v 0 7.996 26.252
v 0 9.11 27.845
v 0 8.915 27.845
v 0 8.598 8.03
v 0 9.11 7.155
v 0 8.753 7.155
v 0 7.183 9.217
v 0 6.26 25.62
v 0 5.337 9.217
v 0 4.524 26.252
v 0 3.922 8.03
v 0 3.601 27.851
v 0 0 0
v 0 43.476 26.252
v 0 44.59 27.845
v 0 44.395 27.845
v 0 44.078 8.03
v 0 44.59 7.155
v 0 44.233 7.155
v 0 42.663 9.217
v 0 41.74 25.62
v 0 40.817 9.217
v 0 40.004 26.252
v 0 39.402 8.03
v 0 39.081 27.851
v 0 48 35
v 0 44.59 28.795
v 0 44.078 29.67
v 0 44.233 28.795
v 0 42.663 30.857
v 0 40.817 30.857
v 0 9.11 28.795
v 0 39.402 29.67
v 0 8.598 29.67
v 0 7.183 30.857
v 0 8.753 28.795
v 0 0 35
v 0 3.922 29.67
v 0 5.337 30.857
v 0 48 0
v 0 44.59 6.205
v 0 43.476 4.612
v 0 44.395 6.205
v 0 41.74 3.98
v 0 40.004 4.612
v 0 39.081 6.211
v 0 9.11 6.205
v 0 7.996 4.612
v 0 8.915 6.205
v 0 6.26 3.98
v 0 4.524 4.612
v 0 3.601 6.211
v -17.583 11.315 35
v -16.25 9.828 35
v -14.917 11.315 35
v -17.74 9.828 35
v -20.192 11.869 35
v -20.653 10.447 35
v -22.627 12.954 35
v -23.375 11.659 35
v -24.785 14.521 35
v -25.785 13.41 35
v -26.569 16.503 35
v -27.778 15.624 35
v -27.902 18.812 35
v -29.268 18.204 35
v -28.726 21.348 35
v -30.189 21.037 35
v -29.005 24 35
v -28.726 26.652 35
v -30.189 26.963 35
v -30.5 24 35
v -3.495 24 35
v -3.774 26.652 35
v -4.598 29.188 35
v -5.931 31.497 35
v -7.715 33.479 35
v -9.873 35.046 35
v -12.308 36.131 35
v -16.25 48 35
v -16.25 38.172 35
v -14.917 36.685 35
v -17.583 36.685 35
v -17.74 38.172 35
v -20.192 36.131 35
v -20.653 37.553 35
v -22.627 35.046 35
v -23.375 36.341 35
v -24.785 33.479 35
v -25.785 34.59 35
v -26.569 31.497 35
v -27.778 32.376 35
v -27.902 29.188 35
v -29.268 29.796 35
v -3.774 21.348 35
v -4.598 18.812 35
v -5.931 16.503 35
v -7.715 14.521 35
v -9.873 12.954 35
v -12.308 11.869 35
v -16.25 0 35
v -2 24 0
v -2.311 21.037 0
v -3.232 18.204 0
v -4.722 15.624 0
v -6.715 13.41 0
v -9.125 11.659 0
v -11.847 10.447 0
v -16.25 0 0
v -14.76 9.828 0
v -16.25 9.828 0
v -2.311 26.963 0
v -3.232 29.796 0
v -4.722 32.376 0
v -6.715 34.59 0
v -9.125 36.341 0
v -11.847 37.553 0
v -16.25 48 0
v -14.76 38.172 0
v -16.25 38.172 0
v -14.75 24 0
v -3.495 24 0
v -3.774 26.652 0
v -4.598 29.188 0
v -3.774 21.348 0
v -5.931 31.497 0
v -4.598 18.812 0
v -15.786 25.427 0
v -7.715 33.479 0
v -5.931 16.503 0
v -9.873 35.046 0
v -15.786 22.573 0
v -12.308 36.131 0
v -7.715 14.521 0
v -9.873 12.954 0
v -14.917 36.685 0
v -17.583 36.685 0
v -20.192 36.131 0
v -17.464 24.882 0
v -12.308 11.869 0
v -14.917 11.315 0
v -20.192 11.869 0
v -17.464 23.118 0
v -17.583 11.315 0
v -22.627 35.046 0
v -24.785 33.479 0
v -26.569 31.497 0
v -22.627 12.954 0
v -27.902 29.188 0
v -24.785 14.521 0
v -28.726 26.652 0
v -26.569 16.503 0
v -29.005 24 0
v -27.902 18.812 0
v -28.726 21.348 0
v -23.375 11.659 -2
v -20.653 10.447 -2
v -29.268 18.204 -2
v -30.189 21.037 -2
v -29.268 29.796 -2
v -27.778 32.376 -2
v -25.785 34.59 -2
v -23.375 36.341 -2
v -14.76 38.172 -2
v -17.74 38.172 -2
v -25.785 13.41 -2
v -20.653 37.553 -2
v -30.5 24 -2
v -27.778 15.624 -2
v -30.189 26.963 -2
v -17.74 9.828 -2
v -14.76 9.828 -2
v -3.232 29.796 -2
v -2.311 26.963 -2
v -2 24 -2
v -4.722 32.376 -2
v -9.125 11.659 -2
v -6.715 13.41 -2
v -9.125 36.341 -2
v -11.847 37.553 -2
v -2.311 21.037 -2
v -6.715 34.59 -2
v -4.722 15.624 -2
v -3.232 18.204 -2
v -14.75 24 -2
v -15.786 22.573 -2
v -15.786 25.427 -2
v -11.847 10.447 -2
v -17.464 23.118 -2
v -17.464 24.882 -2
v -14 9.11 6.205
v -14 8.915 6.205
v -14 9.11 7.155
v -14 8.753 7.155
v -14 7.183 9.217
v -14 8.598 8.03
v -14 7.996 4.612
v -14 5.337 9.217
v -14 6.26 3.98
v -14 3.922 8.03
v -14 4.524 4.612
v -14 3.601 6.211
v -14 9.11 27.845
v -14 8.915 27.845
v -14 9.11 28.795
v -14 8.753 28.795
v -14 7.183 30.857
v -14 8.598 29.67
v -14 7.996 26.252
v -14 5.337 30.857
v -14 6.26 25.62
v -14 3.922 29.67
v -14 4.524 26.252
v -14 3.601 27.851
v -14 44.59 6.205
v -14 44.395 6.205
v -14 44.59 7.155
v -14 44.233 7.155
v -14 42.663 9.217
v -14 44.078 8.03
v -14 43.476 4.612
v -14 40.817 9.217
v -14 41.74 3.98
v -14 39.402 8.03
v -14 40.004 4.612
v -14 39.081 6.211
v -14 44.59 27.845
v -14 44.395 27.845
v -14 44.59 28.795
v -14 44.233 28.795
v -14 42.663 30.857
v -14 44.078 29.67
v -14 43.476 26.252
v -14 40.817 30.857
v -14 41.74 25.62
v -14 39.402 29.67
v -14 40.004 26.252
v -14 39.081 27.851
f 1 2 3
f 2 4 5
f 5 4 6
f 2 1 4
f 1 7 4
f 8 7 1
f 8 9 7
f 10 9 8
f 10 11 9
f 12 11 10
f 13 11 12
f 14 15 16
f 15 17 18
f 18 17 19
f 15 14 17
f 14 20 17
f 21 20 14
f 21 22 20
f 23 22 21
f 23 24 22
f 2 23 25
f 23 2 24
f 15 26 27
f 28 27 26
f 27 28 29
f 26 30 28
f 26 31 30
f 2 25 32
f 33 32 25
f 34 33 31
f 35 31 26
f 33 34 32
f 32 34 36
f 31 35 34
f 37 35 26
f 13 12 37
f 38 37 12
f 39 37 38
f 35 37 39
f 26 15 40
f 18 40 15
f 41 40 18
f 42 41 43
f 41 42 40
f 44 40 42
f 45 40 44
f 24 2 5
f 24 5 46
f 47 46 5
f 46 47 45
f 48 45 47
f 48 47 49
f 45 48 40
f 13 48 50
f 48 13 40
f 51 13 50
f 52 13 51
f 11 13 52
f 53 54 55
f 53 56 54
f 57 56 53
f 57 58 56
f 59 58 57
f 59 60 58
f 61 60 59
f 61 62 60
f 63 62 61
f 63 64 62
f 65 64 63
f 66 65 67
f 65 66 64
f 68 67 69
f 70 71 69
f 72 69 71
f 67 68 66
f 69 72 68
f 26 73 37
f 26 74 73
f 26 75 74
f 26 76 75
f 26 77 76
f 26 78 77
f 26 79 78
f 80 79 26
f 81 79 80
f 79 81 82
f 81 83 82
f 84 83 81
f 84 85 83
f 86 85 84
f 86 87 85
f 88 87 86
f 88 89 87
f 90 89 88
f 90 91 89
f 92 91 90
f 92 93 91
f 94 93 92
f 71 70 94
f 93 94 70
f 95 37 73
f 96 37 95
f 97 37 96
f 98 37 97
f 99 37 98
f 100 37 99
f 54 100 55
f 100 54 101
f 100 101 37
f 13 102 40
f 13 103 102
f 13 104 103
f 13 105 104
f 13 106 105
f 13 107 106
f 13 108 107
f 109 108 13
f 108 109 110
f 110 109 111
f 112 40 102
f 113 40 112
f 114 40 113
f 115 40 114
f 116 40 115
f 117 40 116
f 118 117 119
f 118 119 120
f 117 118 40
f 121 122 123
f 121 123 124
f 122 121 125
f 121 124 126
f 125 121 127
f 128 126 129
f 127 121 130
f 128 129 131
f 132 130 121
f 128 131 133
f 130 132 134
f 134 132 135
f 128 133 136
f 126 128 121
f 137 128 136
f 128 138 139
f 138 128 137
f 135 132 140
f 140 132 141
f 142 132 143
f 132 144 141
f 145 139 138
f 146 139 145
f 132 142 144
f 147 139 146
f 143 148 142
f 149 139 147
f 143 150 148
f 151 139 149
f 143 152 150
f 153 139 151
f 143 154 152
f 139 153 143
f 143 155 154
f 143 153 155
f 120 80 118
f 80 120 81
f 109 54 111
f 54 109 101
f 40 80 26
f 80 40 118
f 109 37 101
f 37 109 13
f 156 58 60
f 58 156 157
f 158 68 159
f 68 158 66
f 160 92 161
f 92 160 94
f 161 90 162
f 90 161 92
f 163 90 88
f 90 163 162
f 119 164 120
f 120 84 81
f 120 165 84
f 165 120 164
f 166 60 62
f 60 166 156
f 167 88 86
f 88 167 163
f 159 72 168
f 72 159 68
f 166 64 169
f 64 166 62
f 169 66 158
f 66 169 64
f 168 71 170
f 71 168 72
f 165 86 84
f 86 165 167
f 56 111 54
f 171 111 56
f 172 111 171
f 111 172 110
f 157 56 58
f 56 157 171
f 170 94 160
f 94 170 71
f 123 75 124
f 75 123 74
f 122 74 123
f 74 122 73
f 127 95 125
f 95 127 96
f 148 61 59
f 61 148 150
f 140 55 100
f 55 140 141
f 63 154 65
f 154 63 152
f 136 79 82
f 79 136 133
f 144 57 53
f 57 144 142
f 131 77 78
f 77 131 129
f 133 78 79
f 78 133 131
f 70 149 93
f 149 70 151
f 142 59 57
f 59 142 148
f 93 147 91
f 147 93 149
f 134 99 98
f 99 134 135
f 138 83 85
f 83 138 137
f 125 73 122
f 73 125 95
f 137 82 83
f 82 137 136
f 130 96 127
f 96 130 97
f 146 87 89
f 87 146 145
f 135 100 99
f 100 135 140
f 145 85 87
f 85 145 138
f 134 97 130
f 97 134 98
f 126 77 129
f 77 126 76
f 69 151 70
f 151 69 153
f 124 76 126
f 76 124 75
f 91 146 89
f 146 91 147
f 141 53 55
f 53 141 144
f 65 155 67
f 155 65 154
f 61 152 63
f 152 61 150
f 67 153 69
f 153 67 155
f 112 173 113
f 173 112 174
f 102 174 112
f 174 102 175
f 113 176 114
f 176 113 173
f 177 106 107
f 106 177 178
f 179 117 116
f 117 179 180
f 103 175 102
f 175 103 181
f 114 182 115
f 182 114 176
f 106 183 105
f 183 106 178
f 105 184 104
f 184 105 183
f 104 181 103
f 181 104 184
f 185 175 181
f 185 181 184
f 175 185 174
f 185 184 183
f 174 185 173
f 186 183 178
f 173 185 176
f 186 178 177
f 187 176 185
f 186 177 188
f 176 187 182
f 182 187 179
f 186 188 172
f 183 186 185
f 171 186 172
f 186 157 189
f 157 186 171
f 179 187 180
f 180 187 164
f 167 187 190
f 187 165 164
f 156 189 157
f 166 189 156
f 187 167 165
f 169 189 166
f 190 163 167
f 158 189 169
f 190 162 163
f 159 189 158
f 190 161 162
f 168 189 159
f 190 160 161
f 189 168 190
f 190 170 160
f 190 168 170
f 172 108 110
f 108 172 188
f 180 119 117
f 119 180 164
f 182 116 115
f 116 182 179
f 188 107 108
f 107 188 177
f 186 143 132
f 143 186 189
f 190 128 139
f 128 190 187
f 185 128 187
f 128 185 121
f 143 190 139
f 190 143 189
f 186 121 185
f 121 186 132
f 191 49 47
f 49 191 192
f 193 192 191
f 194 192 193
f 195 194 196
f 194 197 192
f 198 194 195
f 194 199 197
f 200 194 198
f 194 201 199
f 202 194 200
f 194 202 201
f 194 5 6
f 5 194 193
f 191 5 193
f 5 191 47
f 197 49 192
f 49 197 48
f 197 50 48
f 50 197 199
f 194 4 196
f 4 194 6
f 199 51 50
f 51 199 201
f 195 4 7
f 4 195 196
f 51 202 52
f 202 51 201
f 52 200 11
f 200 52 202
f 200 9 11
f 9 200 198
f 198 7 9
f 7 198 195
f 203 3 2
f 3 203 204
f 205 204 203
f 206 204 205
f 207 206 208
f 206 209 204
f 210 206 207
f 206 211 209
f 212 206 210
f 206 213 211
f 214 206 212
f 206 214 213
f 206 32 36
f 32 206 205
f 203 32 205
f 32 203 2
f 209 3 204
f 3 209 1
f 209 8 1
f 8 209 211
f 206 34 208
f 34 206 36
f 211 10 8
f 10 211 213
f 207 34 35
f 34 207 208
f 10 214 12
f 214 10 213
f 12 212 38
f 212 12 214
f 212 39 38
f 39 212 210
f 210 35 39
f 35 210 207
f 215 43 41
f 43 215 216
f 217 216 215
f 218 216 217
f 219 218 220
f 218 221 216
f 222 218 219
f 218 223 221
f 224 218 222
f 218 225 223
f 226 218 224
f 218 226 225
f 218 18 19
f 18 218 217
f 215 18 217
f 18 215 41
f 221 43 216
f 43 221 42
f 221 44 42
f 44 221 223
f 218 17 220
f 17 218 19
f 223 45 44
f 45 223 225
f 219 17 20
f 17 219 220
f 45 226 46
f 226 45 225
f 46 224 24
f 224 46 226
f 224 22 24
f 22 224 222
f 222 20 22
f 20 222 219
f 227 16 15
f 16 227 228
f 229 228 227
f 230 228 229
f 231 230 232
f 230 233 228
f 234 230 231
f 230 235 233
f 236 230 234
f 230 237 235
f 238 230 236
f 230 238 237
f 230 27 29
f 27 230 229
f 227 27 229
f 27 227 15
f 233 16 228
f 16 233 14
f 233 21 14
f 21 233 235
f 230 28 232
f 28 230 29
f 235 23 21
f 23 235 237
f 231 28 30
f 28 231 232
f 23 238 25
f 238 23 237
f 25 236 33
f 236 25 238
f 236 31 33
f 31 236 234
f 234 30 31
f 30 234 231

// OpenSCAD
outer = 28.5;
inner = 25.51;
length = 35;
width = 48;
h_foot = 2;

flicker = 0.2;

difference() {
    core(-outer / 2 - h_foot, width / 2, 0);
    holes(width, length, 14);
}

module core(x, y, z) {
    close_depth = 2;
    translate([x, y, z]) {
        union() {
            difference() {
                union() {
                    translate([0, -width / 2, 0]) {
                        cube([h_foot + outer / 2, width, length]);
                    }
                    cylinder(length, d = outer);
                }
                cylinder(length + flicker, d = inner);
            }
            translate([0, 0, -close_depth]) {
                difference() {
                    cylinder(close_depth, d = outer);
                    cylinder(close_depth + flicker * 2, d = 3);
                }
            }
        }
    }
}

module holes(width, length, depth) {
    wall = 0.95;
    inner = 3.1;
    tolerance = 0.2;

    hole_size = inner + wall * 2;
    dz = 16.64 + hole_size;
    dy = 30.48 + hole_size;
    size_z = dz + hole_size;
    size_y = dy + hole_size;

    offy = (width / 2 - size_y / 2);
    offz = (length / 2 - size_z / 2);

    hole(inner, wall, tolerance, depth, offy, offz);
    hole(inner, wall, tolerance, depth, offy, offz + dz);
    hole(inner, wall, tolerance, depth, offy + dy, offz);
    hole(inner, wall, tolerance, depth, offy + dy, offz + dz);
}


module hole(inner, wall, tolerance, h, y, z) {
    d = wall * 2 + inner;
    r = d / 2;

    translate([-h, y + r, z + r]) {
        rotate([0, 90, 0]) {
            translate([-wall / 2, wall, 0]) {
                cube([wall, 2 - tolerance / 2, h + flicker]);
            }
            cylinder(h = h + flicker, r1 = r + tolerance, r2 = r + tolerance);
        }
    }
}
